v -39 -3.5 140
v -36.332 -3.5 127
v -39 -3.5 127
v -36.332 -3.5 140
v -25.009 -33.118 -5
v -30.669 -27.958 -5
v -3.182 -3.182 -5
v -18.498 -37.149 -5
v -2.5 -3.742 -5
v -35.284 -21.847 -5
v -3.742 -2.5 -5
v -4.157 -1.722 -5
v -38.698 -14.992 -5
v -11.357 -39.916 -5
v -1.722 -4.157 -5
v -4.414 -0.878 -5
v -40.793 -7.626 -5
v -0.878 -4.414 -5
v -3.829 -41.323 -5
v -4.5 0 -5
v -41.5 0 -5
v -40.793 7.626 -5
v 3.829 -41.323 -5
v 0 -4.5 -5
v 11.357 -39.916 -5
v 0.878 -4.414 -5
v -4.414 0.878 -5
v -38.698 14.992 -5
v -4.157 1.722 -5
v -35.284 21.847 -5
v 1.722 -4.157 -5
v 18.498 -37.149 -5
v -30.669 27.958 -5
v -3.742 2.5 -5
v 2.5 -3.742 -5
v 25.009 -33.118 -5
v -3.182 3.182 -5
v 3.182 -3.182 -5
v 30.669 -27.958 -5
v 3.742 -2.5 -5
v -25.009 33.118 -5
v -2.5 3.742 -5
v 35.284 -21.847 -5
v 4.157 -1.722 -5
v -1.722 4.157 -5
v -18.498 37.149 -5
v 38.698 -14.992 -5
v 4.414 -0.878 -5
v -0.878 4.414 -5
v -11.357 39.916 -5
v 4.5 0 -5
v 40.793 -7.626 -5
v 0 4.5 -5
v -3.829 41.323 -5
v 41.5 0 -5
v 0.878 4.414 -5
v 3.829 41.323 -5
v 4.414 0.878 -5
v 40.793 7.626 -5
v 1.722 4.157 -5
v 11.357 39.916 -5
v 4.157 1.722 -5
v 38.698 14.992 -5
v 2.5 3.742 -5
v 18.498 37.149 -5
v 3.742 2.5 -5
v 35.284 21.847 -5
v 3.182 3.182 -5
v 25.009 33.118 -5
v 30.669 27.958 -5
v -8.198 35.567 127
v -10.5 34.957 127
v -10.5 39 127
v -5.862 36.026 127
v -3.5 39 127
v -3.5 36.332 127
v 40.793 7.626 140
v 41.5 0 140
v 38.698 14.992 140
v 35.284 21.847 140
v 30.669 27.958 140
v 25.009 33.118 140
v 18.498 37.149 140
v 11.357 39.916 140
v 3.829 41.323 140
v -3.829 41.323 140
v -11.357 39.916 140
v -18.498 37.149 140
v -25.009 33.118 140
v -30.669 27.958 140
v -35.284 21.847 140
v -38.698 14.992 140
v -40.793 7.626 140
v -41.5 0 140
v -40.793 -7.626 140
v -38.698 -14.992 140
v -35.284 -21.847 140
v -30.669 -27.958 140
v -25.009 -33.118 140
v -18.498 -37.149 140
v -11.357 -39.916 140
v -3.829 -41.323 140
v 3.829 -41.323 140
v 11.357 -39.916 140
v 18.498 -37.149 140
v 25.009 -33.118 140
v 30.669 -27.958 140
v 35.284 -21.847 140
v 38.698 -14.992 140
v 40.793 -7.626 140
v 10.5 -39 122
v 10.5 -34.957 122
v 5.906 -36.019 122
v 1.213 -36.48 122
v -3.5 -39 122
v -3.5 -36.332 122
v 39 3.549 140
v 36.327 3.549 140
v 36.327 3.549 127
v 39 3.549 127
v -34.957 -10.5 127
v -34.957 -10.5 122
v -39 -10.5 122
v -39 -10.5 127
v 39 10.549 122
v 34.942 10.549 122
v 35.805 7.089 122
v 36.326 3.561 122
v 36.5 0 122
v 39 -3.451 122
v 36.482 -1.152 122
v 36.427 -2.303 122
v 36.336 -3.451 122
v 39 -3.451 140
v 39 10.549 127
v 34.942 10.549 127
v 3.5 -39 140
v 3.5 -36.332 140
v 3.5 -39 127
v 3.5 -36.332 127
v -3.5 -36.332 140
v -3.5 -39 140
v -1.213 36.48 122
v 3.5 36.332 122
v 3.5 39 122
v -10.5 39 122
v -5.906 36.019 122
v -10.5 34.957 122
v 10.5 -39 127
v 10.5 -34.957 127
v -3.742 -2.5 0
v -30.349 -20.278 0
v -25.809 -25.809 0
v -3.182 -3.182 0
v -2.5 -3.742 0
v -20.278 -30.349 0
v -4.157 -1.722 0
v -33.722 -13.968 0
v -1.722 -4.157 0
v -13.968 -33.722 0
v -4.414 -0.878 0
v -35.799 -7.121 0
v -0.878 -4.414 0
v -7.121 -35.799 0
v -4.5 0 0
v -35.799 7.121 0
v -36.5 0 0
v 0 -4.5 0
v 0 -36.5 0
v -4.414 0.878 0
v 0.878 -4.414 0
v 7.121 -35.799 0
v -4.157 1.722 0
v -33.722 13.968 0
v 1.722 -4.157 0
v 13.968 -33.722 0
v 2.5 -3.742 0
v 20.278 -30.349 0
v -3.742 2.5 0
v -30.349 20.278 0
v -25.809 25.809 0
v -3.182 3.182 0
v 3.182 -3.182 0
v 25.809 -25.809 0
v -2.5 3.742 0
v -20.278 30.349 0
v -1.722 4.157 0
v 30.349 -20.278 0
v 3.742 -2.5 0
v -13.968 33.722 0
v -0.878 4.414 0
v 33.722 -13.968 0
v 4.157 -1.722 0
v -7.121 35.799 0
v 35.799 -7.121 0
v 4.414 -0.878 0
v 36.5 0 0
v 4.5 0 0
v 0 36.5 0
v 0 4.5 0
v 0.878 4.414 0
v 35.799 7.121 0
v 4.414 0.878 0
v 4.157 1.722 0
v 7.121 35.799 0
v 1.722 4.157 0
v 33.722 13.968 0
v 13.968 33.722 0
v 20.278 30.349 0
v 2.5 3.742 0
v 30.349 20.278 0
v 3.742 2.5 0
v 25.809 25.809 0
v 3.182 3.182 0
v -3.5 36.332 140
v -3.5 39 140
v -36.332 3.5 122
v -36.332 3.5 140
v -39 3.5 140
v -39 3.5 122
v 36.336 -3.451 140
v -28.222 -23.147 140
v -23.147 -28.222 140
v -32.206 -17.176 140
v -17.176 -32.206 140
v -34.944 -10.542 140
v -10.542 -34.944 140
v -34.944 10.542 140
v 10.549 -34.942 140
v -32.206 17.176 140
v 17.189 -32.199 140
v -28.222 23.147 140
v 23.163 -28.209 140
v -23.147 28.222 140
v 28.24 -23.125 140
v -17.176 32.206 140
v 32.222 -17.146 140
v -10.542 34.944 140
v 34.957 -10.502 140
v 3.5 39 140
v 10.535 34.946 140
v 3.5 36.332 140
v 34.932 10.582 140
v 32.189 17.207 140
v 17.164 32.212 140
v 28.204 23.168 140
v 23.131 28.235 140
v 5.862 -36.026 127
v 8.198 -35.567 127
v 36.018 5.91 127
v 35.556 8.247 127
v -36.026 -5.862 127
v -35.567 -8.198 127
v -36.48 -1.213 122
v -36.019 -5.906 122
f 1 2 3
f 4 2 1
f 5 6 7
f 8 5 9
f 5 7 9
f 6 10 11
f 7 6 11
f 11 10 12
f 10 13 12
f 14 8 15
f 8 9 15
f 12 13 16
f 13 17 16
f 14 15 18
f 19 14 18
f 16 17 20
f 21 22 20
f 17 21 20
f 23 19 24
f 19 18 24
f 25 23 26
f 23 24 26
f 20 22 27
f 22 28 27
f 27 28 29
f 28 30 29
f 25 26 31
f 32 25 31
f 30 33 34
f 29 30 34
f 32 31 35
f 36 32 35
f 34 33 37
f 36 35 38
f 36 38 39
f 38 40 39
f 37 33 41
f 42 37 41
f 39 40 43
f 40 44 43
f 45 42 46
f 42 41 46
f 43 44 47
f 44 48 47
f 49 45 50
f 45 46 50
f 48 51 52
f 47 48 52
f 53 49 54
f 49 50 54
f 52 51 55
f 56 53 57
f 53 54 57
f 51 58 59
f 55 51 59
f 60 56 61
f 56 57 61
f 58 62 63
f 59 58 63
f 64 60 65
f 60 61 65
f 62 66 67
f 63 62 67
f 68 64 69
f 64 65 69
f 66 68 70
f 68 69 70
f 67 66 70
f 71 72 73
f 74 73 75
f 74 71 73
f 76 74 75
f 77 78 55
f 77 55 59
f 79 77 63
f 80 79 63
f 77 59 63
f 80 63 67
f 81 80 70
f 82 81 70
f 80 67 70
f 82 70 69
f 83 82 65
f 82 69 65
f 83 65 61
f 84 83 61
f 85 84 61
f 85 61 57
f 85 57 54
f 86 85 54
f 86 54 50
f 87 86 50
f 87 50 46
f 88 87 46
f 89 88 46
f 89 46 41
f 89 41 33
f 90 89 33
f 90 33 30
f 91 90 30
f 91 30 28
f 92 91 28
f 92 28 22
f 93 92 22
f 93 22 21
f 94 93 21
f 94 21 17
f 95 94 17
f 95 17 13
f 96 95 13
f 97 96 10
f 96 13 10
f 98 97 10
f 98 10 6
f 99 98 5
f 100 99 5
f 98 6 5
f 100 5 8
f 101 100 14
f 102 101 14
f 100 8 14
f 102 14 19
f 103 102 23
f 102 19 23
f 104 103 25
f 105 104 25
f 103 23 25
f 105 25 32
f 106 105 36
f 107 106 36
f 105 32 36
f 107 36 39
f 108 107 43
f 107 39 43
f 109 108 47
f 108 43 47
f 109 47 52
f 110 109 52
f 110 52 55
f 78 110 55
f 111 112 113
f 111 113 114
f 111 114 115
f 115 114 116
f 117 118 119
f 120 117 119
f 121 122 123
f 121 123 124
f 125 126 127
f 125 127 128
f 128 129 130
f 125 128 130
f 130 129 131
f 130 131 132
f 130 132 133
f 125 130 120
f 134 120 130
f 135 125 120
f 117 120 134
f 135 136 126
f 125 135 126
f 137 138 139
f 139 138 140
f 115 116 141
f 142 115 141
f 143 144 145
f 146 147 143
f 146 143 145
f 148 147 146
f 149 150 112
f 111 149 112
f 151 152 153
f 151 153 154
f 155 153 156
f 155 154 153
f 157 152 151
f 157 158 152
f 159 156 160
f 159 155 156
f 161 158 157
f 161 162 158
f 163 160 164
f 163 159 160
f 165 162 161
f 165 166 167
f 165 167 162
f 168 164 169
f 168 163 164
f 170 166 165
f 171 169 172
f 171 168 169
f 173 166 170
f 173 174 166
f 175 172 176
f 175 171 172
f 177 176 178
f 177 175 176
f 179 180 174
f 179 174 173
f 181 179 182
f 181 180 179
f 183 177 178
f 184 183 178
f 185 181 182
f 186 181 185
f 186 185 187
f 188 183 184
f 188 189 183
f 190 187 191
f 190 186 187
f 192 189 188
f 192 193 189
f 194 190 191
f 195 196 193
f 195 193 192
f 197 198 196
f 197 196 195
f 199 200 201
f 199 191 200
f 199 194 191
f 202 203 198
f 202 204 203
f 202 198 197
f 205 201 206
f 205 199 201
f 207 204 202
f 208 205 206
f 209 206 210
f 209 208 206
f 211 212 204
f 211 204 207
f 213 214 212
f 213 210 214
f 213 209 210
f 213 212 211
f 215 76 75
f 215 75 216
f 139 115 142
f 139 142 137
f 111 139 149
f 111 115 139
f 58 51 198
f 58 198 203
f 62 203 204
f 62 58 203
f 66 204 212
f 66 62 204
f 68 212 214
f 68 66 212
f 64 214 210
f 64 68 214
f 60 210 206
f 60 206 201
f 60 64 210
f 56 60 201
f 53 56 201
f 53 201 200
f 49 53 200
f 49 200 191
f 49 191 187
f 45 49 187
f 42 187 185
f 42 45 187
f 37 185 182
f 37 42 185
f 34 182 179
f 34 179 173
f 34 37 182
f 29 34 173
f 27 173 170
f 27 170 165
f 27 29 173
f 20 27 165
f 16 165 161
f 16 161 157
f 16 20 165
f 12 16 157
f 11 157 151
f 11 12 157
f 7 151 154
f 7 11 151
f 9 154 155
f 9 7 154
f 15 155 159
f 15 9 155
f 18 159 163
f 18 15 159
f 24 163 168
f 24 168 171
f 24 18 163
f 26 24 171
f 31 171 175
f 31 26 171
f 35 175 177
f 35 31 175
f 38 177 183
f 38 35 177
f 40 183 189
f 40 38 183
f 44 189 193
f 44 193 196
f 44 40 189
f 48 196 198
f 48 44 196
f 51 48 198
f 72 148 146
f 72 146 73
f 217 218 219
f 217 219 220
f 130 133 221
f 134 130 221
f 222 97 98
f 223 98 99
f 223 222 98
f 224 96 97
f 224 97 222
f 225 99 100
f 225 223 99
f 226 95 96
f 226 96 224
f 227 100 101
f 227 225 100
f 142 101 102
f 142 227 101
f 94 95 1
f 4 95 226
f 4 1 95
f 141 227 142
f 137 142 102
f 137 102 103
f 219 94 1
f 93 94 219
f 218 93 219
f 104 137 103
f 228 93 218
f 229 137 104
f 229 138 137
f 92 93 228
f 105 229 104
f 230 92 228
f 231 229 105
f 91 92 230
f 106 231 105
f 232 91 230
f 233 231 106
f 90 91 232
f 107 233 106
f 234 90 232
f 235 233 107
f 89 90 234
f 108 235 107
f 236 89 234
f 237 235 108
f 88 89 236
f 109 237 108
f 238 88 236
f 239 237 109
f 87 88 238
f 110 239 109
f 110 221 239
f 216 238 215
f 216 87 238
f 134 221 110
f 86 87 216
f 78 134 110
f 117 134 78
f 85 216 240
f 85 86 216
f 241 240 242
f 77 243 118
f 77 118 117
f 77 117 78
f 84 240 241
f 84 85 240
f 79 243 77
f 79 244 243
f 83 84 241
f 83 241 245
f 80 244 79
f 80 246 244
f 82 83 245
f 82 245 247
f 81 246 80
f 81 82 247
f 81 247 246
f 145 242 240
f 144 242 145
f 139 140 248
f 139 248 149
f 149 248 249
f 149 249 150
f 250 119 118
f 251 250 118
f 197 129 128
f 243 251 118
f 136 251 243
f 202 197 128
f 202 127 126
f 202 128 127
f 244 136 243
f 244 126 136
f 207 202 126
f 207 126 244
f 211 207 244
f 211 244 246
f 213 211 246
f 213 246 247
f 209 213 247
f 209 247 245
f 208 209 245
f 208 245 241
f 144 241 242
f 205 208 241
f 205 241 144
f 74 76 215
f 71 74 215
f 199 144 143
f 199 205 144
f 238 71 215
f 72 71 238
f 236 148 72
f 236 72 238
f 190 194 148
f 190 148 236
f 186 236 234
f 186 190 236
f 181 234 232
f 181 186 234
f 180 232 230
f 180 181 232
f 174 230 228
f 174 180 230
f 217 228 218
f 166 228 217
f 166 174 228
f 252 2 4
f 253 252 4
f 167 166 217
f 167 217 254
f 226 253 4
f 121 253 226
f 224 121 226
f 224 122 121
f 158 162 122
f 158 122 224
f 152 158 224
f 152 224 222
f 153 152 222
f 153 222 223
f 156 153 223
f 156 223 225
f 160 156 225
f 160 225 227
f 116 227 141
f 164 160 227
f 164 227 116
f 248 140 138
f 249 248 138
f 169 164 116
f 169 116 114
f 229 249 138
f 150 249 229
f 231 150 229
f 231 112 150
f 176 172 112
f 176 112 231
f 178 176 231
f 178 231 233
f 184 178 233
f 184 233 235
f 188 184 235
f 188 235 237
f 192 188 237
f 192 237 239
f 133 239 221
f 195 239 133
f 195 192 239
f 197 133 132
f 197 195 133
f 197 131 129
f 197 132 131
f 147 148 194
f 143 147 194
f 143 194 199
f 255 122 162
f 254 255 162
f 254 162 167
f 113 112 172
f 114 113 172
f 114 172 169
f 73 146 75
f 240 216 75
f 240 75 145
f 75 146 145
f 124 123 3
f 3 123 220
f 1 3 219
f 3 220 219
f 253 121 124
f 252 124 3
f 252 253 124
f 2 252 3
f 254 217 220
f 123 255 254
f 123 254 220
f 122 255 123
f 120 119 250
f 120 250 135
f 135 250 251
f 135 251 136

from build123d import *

# Parameters (mm, degrees)
SKETCH2_R           = 41.5
SKETCH2_R_2         = 36.5
BOSS_EXTRUDE2_DEPTH = 140
BOSS_EXTRUDE3_START = -5
SKETCH13_R          = 41.5
SKETCH13_R_2        = 4.5
BOSS_EXTRUDE3_DEPTH = 5
CUT_EXTRUDE1_DEPTH  = 39
CUT_EXTRUDE2_DEPTH  = 39
CUT_EXTRUDE3_DEPTH  = 39
CUT_EXTRUDE4_DEPTH  = 39


with BuildPart() as part:
    # Sketch2 → Boss-Extrude2 (new body)
    with BuildSketch(Plane.XY):
        Circle(SKETCH2_R)
        Circle(SKETCH2_R_2, mode=Mode.SUBTRACT)
    extrude(amount=BOSS_EXTRUDE2_DEPTH)

    # Sketch13 → Boss-Extrude3 (add)
    with BuildSketch(Plane.XY.offset(BOSS_EXTRUDE3_START)):
        Circle(SKETCH13_R)
        Circle(SKETCH13_R_2, mode=Mode.SUBTRACT)
    extrude(amount=BOSS_EXTRUDE3_DEPTH)

    # Sketch14 → Cut-Extrude1 (cut)
    with BuildSketch(Plane(origin=(0, 0, 0), x_dir=(1, 0, 0), z_dir=(0, 1, 0))):
        Polygon((3.5, -127), (10.5, -127), (10.5, -122), (-3.5, -122), (-3.5, -140), (3.5, -140), align=None)
    extrude(amount=-CUT_EXTRUDE1_DEPTH, mode=Mode.SUBTRACT)

    # Sketch16 → Cut-Extrude2 (cut)
    with BuildSketch(Plane(origin=(0, 0, 0), x_dir=(0, 0, -1), z_dir=(1, 0, 0))):
        Polygon((-140, 3.548648678), (-127, 3.548648678), (-127, 10.548648678), (-122, 10.548648678), (-122, -3.451351322), (-140, -3.451351322), align=None)
    extrude(amount=CUT_EXTRUDE2_DEPTH, mode=Mode.SUBTRACT)

    # Sketch19 → Cut-Extrude3 (cut)
    with BuildSketch(Plane(origin=(0, 0, 0), x_dir=(1, 0, 0), z_dir=(0, 1, 0))):
        Polygon((3.5, -140), (3.5, -122), (-10.5, -122), (-10.5, -127), (-3.5, -127), (-3.5, -140), align=None)
    extrude(amount=CUT_EXTRUDE3_DEPTH, mode=Mode.SUBTRACT)

    # Sketch20 → Cut-Extrude4 (cut)
    with BuildSketch(Plane(origin=(0, 0, 0), x_dir=(0, 0, -1), z_dir=(1, 0, 0))):
        Polygon((-127, -3.5), (-140, -3.5), (-140, 3.5), (-122, 3.5), (-122, -10.5), (-127, -10.5), align=None)
    extrude(amount=-CUT_EXTRUDE4_DEPTH, mode=Mode.SUBTRACT)


solid = part.part
